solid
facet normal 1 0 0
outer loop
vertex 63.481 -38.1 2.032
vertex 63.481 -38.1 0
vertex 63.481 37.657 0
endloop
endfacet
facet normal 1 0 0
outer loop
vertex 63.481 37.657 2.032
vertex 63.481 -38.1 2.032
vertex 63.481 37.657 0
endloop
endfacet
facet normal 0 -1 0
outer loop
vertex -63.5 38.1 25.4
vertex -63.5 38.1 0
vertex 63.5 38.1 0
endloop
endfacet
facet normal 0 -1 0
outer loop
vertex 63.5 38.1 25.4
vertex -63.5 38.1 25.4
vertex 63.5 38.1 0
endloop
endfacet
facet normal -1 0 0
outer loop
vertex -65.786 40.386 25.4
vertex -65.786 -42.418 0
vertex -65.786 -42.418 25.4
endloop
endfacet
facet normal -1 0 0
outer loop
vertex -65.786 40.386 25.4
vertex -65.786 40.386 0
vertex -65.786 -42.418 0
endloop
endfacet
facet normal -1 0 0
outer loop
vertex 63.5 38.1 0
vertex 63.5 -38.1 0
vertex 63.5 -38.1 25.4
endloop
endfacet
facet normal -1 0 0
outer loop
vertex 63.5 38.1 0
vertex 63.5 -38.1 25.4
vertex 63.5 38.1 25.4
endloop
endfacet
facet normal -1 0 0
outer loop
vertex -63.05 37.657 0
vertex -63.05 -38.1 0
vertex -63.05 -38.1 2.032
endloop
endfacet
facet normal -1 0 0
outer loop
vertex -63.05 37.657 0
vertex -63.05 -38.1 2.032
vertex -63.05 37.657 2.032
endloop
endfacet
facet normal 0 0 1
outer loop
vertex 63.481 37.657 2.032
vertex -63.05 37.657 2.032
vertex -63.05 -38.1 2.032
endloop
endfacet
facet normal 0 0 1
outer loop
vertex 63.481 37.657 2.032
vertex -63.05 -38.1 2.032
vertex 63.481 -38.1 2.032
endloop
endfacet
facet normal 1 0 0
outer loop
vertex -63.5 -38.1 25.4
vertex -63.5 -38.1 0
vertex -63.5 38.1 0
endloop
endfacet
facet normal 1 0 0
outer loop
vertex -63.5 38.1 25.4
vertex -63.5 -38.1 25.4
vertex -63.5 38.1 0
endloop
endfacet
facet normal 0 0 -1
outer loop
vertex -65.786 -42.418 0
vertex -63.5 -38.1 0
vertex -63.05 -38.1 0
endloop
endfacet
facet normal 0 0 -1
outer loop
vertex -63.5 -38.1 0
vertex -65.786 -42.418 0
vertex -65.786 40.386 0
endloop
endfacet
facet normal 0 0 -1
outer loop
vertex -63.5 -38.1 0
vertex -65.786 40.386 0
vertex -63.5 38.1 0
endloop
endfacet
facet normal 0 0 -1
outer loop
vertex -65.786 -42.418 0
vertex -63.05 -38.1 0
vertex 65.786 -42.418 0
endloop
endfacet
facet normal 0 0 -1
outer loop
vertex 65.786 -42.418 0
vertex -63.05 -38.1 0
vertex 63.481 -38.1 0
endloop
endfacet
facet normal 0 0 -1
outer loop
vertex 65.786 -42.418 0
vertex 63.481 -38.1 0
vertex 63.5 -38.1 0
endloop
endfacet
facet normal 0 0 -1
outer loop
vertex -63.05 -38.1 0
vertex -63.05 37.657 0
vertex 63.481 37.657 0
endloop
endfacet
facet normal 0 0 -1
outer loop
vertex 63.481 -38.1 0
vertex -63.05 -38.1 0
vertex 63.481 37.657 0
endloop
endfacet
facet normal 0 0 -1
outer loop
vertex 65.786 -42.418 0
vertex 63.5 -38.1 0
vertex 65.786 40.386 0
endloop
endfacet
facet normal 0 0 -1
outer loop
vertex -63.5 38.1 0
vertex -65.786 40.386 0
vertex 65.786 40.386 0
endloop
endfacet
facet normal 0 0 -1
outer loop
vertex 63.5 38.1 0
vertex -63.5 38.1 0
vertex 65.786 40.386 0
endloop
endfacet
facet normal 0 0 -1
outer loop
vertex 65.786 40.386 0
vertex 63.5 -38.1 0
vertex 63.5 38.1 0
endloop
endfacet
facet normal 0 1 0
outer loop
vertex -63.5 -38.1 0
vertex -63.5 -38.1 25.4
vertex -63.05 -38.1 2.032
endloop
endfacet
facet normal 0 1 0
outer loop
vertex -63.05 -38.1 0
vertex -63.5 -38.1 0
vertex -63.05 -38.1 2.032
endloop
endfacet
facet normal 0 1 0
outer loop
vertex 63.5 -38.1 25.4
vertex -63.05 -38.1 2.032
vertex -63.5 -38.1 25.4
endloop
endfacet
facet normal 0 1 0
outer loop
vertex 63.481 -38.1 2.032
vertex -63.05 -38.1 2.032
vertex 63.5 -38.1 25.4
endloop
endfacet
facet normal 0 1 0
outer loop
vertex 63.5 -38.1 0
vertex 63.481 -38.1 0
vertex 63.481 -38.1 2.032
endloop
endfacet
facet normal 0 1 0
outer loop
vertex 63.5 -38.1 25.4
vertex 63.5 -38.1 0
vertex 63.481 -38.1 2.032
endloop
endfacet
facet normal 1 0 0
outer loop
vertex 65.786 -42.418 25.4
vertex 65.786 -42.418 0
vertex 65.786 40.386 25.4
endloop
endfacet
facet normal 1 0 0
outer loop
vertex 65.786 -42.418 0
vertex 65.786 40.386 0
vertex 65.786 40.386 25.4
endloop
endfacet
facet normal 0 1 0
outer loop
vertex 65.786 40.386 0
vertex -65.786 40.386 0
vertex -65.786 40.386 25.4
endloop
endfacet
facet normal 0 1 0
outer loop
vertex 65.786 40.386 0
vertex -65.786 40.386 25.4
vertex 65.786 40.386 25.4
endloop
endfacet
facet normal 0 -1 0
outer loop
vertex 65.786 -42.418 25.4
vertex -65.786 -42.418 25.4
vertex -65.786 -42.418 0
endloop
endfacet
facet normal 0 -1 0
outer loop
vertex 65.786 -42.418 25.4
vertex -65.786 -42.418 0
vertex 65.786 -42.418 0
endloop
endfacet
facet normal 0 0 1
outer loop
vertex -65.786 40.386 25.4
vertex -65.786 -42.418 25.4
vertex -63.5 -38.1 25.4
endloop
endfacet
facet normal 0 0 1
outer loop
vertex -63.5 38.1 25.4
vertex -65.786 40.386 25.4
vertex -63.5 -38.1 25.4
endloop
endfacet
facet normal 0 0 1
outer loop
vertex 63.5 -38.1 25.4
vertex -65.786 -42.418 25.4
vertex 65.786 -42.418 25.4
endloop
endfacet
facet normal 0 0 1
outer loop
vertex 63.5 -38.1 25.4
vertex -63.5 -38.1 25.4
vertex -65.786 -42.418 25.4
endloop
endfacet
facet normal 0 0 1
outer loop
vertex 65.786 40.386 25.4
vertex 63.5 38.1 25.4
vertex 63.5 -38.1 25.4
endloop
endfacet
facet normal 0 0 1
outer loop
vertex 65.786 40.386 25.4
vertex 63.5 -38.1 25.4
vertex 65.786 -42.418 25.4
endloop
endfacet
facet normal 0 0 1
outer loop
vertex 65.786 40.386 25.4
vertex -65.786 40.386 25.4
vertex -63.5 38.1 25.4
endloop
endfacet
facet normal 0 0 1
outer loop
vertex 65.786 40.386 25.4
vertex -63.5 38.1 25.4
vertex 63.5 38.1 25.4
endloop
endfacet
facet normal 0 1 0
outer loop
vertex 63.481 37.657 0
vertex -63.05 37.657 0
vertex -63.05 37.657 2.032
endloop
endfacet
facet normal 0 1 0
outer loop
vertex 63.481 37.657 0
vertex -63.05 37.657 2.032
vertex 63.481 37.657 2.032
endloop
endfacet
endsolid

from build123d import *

# Parameters (mm, degrees)
F0_W      = 131.572
F0_H      = 80.772
F0_W_2    = 127
F0_H_2    = 76.2
F1_DEPTH  = 25.4
F1_FACE_W = 131.572
F1_FACE_H = 25.4
F3_DEPTH  = 2.032
F2_W      = 126.530789
F2_H      = 75.769949
F4_DEPTH  = 2.032


with BuildPart() as f1:
    # F0 (on Top) → F1 (new body)
    with BuildSketch(Plane.XY):
        Rectangle(F0_W, F0_H)
        Rectangle(F0_W_2, F0_H_2, mode=Mode.SUBTRACT)
    extrude(amount=F1_DEPTH)

    # F1_face (on face) → F3 (join)
    with BuildSketch(Plane(origin=(0, -40.386, 12.7), x_dir=(1, 0, 0), z_dir=(0, -1, 0))):
        Rectangle(F1_FACE_W, F1_FACE_H)
    extrude(amount=F3_DEPTH)

    # F2 (on Top) → F4 (join)
    with BuildSketch(Plane.XY):
        with Locations((0.215594, -0.227573)):
            Rectangle(F2_W, F2_H)
    extrude(amount=F4_DEPTH)


solid = f1.part
